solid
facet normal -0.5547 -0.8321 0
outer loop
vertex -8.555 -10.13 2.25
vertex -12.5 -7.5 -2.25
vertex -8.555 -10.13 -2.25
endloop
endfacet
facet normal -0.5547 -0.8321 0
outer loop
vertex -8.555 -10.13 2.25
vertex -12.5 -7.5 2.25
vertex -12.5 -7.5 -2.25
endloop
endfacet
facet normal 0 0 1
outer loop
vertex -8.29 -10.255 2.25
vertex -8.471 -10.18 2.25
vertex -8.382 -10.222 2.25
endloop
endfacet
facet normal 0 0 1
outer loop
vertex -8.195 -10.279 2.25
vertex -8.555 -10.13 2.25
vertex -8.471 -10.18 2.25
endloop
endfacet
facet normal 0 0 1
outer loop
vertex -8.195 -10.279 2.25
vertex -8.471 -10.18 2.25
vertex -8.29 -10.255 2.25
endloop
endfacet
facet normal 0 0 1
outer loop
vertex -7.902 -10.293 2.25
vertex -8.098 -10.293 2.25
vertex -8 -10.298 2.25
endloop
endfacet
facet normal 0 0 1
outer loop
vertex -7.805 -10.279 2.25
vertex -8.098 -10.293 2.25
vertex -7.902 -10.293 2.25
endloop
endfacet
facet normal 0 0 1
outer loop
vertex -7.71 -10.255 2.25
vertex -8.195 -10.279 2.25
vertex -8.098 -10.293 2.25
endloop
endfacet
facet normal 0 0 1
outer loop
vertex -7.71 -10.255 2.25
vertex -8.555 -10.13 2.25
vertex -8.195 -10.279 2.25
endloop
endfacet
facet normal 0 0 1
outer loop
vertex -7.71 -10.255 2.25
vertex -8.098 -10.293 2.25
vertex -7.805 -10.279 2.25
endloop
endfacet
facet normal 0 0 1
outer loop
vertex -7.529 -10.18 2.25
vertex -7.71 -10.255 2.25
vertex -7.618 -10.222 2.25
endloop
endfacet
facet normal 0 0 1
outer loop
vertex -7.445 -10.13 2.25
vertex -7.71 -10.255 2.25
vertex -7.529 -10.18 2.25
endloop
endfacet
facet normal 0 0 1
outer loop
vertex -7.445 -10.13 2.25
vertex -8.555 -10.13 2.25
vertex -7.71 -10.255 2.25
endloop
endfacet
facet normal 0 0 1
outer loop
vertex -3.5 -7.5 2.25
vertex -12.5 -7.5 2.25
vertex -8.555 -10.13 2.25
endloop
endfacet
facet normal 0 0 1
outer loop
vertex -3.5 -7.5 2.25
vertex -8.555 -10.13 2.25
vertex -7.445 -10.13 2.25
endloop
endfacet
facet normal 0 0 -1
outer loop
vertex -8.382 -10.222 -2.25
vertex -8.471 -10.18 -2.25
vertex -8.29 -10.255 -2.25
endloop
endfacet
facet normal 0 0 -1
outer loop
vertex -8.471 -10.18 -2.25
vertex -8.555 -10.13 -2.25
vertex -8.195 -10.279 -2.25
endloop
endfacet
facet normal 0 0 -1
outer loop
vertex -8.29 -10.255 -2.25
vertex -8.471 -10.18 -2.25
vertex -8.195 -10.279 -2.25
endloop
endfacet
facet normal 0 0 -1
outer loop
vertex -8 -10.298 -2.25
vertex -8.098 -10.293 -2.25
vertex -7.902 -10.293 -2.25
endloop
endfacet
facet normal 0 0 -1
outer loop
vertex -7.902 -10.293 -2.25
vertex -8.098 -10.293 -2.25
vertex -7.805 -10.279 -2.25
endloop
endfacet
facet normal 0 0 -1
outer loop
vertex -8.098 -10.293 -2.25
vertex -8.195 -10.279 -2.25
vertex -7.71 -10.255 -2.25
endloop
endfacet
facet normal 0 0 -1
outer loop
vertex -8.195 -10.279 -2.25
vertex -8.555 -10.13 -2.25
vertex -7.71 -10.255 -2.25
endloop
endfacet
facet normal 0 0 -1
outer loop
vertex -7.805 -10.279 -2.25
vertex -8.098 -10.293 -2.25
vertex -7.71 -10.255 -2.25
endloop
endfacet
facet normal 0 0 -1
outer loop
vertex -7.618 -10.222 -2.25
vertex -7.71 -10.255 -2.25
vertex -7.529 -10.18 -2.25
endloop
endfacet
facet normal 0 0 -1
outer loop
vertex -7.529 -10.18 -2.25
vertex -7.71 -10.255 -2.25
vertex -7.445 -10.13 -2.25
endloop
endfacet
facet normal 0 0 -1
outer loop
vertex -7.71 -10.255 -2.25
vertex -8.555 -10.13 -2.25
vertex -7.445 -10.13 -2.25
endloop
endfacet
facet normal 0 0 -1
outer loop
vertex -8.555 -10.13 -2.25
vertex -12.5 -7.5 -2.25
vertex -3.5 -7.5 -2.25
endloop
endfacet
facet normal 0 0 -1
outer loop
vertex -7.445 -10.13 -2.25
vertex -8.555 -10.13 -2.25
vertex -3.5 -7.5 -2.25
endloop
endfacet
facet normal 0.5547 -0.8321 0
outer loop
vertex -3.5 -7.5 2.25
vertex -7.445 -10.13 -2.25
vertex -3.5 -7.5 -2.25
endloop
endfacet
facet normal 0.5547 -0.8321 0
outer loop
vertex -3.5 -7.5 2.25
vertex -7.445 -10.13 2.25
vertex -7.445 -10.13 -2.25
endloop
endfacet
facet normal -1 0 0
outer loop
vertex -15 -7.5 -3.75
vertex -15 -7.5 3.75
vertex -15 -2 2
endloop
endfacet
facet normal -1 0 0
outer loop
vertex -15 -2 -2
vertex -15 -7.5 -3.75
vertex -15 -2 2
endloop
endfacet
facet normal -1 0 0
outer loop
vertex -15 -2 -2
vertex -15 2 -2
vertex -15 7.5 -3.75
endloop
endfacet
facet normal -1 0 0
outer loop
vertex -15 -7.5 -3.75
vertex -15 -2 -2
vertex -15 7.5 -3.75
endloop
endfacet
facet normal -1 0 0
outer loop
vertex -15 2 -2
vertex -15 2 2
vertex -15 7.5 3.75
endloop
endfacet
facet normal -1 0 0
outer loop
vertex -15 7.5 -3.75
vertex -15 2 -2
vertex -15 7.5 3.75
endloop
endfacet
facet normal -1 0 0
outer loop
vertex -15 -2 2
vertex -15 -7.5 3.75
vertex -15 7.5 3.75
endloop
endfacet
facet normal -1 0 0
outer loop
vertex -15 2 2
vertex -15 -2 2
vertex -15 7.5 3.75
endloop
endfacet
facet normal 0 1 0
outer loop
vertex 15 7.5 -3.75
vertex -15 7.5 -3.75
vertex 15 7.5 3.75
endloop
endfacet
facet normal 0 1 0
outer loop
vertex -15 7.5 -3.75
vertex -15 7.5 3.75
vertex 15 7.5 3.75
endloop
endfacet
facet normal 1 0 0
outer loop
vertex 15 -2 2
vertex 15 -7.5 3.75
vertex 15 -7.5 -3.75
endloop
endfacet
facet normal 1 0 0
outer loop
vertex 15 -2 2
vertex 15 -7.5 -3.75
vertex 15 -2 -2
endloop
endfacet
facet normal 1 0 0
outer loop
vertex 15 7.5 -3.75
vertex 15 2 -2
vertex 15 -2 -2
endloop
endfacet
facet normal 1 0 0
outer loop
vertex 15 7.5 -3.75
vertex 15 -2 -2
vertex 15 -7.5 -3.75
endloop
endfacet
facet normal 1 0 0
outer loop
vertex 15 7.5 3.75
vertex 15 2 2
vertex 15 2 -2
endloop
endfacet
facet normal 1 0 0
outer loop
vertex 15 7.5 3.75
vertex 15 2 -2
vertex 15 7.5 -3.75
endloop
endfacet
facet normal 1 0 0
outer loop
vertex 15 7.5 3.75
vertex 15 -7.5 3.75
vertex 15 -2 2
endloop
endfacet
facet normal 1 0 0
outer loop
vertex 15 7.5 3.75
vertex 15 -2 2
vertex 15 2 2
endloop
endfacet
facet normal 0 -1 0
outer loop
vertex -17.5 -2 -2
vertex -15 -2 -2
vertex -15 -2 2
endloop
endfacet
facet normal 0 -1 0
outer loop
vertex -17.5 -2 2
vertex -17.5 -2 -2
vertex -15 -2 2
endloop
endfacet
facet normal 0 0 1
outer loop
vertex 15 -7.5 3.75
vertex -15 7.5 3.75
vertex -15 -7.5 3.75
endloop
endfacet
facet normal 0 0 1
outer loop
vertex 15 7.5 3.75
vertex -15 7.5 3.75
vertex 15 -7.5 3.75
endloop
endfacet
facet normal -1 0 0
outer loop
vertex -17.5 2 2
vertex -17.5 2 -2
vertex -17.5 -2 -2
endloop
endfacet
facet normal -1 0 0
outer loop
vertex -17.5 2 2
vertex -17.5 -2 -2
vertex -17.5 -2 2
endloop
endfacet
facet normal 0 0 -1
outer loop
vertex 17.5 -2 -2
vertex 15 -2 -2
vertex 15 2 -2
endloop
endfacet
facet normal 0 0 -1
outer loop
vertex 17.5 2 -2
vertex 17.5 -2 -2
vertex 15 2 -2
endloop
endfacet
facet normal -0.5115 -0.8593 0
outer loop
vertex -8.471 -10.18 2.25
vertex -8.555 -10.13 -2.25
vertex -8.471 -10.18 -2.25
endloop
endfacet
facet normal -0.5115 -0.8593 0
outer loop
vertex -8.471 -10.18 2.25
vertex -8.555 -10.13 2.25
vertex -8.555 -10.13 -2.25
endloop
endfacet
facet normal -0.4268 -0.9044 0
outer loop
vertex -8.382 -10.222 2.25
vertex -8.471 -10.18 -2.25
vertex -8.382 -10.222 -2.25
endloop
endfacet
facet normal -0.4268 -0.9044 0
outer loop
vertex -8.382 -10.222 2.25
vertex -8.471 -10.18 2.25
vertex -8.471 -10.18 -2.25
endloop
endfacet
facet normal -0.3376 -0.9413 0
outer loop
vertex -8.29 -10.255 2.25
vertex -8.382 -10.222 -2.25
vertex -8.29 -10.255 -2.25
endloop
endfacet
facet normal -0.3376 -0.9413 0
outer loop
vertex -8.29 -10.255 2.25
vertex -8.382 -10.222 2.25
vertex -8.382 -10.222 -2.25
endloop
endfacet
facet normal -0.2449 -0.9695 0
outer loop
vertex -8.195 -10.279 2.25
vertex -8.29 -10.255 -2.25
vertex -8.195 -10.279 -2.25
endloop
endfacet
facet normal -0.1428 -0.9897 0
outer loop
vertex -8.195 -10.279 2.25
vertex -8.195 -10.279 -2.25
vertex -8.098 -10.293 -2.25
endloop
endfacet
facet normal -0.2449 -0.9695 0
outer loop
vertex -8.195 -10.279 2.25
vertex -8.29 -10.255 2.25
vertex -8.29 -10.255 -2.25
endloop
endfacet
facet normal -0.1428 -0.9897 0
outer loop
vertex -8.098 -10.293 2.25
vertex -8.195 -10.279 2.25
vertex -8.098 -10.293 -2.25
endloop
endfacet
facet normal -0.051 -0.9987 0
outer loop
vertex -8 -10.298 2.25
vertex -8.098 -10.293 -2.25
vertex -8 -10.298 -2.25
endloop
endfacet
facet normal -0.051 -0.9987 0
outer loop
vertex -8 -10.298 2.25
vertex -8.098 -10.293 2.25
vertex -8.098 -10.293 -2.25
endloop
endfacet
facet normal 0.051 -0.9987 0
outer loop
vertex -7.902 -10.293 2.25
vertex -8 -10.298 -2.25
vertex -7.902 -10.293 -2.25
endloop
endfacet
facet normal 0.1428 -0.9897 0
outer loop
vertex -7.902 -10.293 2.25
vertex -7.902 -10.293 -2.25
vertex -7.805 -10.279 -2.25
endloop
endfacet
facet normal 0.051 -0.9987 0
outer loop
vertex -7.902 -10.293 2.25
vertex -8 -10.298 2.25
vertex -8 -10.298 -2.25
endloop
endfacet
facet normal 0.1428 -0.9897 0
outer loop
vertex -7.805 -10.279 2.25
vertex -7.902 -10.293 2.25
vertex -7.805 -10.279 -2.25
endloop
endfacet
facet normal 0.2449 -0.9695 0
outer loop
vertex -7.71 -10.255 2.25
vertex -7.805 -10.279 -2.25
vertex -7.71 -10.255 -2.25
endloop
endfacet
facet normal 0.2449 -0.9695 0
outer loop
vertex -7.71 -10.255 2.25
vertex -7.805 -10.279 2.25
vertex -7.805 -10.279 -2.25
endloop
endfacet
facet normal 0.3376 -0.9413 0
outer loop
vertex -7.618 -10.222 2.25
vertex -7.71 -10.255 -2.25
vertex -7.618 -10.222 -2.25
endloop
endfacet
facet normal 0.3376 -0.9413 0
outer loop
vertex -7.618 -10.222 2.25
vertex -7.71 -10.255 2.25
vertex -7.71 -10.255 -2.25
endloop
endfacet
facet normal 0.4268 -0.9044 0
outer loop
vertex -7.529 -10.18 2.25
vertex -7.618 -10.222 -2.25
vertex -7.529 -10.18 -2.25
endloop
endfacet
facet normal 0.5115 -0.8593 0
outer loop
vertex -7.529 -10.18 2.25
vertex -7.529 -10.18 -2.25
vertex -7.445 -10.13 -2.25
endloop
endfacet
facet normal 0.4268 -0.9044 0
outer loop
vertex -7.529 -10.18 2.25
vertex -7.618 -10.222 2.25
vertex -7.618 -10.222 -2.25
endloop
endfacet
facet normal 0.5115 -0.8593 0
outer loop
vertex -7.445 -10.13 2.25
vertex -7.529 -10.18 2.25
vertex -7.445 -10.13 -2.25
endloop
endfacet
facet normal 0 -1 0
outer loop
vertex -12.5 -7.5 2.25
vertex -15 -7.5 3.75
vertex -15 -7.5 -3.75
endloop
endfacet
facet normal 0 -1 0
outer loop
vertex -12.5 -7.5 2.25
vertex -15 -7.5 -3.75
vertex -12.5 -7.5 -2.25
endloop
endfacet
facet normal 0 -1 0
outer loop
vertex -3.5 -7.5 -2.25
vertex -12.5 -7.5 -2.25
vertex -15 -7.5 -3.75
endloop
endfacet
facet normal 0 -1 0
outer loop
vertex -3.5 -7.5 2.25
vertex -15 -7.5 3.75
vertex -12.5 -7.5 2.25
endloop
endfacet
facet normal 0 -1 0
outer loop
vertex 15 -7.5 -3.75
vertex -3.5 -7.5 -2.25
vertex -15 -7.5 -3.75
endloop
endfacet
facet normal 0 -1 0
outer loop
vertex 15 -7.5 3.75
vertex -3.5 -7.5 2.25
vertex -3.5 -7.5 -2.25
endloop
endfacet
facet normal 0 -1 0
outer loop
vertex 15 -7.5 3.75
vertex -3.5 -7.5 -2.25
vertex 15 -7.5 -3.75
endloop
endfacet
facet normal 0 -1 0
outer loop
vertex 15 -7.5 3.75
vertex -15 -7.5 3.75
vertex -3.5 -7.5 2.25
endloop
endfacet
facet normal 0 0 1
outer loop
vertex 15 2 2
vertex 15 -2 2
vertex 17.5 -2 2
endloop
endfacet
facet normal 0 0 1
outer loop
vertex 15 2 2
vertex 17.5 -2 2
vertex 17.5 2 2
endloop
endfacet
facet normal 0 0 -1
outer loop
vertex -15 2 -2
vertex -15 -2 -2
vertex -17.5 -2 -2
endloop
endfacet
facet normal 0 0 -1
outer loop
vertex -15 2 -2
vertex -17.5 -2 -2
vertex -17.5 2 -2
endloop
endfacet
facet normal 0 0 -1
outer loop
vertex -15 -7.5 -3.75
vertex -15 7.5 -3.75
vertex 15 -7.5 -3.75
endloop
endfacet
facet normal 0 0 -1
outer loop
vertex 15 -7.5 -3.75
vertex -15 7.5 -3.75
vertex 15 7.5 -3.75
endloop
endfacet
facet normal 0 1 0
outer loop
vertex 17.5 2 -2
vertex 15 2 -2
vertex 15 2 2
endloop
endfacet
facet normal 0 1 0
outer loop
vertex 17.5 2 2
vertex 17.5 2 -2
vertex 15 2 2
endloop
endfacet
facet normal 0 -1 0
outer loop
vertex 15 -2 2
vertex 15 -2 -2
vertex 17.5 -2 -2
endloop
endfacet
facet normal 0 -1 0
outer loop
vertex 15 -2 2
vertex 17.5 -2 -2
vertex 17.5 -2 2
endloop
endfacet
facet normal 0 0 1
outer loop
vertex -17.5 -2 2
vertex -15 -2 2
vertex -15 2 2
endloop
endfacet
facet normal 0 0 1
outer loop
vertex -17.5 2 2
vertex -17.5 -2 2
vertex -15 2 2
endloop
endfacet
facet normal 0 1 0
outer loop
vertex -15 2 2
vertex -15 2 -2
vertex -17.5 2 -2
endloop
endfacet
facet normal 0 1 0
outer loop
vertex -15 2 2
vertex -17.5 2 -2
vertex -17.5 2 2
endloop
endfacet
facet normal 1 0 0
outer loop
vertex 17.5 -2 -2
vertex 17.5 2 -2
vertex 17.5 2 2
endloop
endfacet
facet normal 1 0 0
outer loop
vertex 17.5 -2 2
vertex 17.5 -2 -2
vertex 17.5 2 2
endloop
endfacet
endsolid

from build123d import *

# Parameters (mm, degrees)
SKETCH_1_W      = 30
SKETCH_1_H      = 15
EXTRUDE_1_DEPTH = 3.75
SKETCH_2_W      = 4
SKETCH_2_H      = 4
EXTRUDE_2_DEPTH = 2.5
EXTRUDE_3_DEPTH = 2.25
FILLET_1_R      = 1


with BuildPart() as part:
    # 草图1 → 凸台-拉伸1 (new, symmetric)
    with BuildSketch(Plane.XY):
        Rectangle(SKETCH_1_W, SKETCH_1_H)
    extrude(amount=EXTRUDE_1_DEPTH, both=True)

    # 草图2 → 凸台-拉伸2 (add)
    with BuildSketch(Plane.ZY.offset(15)):
        Rectangle(SKETCH_2_W, SKETCH_2_H)
    extrude_2 = extrude(amount=EXTRUDE_2_DEPTH)

    # 镜向1: 凸台-拉伸2 across plane
    add(extrude_2.mirror(Plane(origin=(0, 0, 0), x_dir=(0, 0, 1), z_dir=(1, 0, 0))))

    # 草图4 → 凸台-拉伸3 (add, symmetric)
    with BuildSketch(Plane.XY):
        Polygon((-12.5, -7.5), (-8, -10.5), (-3.5, -7.5), align=None)
    extrude(amount=EXTRUDE_3_DEPTH, both=True)

    # 圆角1
    fillet_1_edges = [part.edges().sort_by_distance(p)[0] for p in [
        (-8, -10.5, 0),
    ]]
    fillet(fillet_1_edges, radius=FILLET_1_R)


solid = part.part
